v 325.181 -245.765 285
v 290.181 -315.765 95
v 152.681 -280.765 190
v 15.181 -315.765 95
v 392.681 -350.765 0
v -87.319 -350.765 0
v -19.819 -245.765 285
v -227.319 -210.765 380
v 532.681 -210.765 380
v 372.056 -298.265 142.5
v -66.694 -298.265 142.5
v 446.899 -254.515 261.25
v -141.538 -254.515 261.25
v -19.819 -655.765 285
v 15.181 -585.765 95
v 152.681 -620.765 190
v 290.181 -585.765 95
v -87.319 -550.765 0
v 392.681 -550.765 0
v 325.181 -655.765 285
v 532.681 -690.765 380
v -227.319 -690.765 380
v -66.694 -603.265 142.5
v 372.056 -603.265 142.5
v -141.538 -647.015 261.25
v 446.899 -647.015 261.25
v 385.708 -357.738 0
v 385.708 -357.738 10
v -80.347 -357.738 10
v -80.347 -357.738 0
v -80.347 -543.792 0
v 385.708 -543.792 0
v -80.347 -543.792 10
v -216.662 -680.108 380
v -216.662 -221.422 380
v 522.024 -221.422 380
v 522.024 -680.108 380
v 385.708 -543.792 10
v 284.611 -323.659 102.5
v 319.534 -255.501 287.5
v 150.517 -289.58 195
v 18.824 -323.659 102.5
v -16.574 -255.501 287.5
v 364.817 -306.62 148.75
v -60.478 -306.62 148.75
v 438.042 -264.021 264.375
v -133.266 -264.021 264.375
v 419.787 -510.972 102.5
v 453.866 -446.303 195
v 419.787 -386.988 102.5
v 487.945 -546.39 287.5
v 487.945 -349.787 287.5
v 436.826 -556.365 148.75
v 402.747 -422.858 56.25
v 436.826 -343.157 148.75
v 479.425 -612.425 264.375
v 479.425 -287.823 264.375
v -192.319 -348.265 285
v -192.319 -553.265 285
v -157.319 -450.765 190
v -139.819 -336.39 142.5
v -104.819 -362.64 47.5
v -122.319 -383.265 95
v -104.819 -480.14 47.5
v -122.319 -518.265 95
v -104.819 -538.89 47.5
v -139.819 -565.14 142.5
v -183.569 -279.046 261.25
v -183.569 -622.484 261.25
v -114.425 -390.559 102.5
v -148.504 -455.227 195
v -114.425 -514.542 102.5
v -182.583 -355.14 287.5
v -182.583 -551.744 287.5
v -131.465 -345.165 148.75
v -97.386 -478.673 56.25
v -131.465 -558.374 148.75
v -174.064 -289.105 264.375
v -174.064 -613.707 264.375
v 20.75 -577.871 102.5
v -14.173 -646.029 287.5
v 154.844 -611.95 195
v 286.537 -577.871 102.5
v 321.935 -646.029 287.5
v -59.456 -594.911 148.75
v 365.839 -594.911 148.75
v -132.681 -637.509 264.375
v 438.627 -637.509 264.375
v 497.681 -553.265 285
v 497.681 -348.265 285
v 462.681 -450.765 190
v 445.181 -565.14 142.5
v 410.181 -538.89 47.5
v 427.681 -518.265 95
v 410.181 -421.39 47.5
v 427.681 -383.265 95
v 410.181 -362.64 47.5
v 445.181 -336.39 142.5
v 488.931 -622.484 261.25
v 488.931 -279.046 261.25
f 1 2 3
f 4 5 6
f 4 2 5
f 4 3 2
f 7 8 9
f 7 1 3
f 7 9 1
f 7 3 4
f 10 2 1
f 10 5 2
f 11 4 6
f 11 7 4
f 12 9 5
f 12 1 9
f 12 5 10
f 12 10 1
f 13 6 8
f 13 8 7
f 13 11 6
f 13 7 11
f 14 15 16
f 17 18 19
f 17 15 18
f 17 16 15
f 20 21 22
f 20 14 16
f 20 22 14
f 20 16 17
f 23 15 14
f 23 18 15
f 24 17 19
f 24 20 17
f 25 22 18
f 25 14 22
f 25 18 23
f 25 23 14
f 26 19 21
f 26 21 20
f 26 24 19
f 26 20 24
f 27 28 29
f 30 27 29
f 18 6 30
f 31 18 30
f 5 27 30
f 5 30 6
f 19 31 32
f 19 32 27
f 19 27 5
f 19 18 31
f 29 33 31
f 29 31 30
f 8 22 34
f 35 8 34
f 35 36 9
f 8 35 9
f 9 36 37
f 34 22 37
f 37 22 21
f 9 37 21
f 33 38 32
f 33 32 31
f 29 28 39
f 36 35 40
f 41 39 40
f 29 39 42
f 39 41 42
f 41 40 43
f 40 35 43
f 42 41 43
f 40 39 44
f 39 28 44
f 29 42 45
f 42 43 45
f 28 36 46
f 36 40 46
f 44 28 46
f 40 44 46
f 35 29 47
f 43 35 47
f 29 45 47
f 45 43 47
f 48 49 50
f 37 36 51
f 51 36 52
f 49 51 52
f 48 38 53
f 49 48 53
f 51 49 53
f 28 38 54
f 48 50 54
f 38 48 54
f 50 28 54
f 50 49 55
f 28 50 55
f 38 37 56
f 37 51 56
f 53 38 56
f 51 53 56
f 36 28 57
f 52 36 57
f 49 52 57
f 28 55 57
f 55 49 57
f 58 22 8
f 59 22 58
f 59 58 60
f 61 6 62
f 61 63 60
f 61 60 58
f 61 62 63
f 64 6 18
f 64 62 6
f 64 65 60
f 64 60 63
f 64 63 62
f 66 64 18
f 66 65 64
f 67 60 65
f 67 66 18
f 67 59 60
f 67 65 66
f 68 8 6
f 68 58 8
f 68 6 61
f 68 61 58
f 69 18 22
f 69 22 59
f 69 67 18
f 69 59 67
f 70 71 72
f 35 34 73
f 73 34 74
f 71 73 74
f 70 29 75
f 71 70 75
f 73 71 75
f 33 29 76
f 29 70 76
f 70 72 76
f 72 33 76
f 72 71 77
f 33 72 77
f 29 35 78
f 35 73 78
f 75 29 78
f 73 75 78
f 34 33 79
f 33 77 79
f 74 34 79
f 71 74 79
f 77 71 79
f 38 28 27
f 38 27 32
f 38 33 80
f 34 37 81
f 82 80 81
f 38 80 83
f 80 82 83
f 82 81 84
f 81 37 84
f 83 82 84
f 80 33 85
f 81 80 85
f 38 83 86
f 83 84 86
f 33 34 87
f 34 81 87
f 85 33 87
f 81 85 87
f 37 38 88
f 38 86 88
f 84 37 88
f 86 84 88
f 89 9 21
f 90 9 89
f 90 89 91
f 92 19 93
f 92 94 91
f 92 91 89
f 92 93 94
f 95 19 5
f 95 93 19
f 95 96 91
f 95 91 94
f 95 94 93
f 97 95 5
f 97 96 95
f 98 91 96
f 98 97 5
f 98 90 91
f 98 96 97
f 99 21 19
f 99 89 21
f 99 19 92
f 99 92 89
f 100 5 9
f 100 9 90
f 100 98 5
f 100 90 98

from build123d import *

# Parameters (mm, degrees)
SHELL1_T            = -10
CUT_EXTRUDE14_DEPTH = 948.525735605


with BuildPart() as part:
    # Sketch17 → Loft1 section 0
    with BuildSketch(Plane.XY):
        with BuildLine():
            Line((-87.319408537, -550.76508799), (392.680591463, -550.76508799))
            Line((392.680591463, -550.76508799), (392.680591463, -350.76508799))
            Line((392.680591463, -350.76508799), (-87.319408537, -350.76508799))
            Line((-87.319408537, -350.76508799), (-87.319408537, -550.76508799))
        make_face()
    # Sketch18 → Loft1 section 1
    with BuildSketch(Plane.XY.offset(380)):
        with BuildLine():
            Line((-227.319408537, -690.76508799), (532.680591463, -690.76508799))
            Line((532.680591463, -690.76508799), (532.680591463, -210.76508799))
            Line((532.680591463, -210.76508799), (-227.319408537, -210.76508799))
            Line((-227.319408537, -210.76508799), (-227.319408537, -690.76508799))
        make_face()
    loft()

    # Shell1
    shell1_openings = [part.faces().sort_by_distance(p)[0] for p in [
        (152.680591463, -450.76508799, 380),
    ]]
    offset(amount=SHELL1_T, openings=shell1_openings, kind=Kind.INTERSECTION)

    # Sketch19 → Cut-Extrude14 (cut, through all)
    with BuildSketch(Plane.XY.offset(10)):
        Polygon((-80.346536573, -357.737959954), (105.707719499, -357.737959954), (385.707719499, -357.737959954), (385.707719499, -543.792216026), (-80.346536573, -543.792216026), align=None)
    extrude(amount=-CUT_EXTRUDE14_DEPTH, mode=Mode.SUBTRACT)


solid = part.part
